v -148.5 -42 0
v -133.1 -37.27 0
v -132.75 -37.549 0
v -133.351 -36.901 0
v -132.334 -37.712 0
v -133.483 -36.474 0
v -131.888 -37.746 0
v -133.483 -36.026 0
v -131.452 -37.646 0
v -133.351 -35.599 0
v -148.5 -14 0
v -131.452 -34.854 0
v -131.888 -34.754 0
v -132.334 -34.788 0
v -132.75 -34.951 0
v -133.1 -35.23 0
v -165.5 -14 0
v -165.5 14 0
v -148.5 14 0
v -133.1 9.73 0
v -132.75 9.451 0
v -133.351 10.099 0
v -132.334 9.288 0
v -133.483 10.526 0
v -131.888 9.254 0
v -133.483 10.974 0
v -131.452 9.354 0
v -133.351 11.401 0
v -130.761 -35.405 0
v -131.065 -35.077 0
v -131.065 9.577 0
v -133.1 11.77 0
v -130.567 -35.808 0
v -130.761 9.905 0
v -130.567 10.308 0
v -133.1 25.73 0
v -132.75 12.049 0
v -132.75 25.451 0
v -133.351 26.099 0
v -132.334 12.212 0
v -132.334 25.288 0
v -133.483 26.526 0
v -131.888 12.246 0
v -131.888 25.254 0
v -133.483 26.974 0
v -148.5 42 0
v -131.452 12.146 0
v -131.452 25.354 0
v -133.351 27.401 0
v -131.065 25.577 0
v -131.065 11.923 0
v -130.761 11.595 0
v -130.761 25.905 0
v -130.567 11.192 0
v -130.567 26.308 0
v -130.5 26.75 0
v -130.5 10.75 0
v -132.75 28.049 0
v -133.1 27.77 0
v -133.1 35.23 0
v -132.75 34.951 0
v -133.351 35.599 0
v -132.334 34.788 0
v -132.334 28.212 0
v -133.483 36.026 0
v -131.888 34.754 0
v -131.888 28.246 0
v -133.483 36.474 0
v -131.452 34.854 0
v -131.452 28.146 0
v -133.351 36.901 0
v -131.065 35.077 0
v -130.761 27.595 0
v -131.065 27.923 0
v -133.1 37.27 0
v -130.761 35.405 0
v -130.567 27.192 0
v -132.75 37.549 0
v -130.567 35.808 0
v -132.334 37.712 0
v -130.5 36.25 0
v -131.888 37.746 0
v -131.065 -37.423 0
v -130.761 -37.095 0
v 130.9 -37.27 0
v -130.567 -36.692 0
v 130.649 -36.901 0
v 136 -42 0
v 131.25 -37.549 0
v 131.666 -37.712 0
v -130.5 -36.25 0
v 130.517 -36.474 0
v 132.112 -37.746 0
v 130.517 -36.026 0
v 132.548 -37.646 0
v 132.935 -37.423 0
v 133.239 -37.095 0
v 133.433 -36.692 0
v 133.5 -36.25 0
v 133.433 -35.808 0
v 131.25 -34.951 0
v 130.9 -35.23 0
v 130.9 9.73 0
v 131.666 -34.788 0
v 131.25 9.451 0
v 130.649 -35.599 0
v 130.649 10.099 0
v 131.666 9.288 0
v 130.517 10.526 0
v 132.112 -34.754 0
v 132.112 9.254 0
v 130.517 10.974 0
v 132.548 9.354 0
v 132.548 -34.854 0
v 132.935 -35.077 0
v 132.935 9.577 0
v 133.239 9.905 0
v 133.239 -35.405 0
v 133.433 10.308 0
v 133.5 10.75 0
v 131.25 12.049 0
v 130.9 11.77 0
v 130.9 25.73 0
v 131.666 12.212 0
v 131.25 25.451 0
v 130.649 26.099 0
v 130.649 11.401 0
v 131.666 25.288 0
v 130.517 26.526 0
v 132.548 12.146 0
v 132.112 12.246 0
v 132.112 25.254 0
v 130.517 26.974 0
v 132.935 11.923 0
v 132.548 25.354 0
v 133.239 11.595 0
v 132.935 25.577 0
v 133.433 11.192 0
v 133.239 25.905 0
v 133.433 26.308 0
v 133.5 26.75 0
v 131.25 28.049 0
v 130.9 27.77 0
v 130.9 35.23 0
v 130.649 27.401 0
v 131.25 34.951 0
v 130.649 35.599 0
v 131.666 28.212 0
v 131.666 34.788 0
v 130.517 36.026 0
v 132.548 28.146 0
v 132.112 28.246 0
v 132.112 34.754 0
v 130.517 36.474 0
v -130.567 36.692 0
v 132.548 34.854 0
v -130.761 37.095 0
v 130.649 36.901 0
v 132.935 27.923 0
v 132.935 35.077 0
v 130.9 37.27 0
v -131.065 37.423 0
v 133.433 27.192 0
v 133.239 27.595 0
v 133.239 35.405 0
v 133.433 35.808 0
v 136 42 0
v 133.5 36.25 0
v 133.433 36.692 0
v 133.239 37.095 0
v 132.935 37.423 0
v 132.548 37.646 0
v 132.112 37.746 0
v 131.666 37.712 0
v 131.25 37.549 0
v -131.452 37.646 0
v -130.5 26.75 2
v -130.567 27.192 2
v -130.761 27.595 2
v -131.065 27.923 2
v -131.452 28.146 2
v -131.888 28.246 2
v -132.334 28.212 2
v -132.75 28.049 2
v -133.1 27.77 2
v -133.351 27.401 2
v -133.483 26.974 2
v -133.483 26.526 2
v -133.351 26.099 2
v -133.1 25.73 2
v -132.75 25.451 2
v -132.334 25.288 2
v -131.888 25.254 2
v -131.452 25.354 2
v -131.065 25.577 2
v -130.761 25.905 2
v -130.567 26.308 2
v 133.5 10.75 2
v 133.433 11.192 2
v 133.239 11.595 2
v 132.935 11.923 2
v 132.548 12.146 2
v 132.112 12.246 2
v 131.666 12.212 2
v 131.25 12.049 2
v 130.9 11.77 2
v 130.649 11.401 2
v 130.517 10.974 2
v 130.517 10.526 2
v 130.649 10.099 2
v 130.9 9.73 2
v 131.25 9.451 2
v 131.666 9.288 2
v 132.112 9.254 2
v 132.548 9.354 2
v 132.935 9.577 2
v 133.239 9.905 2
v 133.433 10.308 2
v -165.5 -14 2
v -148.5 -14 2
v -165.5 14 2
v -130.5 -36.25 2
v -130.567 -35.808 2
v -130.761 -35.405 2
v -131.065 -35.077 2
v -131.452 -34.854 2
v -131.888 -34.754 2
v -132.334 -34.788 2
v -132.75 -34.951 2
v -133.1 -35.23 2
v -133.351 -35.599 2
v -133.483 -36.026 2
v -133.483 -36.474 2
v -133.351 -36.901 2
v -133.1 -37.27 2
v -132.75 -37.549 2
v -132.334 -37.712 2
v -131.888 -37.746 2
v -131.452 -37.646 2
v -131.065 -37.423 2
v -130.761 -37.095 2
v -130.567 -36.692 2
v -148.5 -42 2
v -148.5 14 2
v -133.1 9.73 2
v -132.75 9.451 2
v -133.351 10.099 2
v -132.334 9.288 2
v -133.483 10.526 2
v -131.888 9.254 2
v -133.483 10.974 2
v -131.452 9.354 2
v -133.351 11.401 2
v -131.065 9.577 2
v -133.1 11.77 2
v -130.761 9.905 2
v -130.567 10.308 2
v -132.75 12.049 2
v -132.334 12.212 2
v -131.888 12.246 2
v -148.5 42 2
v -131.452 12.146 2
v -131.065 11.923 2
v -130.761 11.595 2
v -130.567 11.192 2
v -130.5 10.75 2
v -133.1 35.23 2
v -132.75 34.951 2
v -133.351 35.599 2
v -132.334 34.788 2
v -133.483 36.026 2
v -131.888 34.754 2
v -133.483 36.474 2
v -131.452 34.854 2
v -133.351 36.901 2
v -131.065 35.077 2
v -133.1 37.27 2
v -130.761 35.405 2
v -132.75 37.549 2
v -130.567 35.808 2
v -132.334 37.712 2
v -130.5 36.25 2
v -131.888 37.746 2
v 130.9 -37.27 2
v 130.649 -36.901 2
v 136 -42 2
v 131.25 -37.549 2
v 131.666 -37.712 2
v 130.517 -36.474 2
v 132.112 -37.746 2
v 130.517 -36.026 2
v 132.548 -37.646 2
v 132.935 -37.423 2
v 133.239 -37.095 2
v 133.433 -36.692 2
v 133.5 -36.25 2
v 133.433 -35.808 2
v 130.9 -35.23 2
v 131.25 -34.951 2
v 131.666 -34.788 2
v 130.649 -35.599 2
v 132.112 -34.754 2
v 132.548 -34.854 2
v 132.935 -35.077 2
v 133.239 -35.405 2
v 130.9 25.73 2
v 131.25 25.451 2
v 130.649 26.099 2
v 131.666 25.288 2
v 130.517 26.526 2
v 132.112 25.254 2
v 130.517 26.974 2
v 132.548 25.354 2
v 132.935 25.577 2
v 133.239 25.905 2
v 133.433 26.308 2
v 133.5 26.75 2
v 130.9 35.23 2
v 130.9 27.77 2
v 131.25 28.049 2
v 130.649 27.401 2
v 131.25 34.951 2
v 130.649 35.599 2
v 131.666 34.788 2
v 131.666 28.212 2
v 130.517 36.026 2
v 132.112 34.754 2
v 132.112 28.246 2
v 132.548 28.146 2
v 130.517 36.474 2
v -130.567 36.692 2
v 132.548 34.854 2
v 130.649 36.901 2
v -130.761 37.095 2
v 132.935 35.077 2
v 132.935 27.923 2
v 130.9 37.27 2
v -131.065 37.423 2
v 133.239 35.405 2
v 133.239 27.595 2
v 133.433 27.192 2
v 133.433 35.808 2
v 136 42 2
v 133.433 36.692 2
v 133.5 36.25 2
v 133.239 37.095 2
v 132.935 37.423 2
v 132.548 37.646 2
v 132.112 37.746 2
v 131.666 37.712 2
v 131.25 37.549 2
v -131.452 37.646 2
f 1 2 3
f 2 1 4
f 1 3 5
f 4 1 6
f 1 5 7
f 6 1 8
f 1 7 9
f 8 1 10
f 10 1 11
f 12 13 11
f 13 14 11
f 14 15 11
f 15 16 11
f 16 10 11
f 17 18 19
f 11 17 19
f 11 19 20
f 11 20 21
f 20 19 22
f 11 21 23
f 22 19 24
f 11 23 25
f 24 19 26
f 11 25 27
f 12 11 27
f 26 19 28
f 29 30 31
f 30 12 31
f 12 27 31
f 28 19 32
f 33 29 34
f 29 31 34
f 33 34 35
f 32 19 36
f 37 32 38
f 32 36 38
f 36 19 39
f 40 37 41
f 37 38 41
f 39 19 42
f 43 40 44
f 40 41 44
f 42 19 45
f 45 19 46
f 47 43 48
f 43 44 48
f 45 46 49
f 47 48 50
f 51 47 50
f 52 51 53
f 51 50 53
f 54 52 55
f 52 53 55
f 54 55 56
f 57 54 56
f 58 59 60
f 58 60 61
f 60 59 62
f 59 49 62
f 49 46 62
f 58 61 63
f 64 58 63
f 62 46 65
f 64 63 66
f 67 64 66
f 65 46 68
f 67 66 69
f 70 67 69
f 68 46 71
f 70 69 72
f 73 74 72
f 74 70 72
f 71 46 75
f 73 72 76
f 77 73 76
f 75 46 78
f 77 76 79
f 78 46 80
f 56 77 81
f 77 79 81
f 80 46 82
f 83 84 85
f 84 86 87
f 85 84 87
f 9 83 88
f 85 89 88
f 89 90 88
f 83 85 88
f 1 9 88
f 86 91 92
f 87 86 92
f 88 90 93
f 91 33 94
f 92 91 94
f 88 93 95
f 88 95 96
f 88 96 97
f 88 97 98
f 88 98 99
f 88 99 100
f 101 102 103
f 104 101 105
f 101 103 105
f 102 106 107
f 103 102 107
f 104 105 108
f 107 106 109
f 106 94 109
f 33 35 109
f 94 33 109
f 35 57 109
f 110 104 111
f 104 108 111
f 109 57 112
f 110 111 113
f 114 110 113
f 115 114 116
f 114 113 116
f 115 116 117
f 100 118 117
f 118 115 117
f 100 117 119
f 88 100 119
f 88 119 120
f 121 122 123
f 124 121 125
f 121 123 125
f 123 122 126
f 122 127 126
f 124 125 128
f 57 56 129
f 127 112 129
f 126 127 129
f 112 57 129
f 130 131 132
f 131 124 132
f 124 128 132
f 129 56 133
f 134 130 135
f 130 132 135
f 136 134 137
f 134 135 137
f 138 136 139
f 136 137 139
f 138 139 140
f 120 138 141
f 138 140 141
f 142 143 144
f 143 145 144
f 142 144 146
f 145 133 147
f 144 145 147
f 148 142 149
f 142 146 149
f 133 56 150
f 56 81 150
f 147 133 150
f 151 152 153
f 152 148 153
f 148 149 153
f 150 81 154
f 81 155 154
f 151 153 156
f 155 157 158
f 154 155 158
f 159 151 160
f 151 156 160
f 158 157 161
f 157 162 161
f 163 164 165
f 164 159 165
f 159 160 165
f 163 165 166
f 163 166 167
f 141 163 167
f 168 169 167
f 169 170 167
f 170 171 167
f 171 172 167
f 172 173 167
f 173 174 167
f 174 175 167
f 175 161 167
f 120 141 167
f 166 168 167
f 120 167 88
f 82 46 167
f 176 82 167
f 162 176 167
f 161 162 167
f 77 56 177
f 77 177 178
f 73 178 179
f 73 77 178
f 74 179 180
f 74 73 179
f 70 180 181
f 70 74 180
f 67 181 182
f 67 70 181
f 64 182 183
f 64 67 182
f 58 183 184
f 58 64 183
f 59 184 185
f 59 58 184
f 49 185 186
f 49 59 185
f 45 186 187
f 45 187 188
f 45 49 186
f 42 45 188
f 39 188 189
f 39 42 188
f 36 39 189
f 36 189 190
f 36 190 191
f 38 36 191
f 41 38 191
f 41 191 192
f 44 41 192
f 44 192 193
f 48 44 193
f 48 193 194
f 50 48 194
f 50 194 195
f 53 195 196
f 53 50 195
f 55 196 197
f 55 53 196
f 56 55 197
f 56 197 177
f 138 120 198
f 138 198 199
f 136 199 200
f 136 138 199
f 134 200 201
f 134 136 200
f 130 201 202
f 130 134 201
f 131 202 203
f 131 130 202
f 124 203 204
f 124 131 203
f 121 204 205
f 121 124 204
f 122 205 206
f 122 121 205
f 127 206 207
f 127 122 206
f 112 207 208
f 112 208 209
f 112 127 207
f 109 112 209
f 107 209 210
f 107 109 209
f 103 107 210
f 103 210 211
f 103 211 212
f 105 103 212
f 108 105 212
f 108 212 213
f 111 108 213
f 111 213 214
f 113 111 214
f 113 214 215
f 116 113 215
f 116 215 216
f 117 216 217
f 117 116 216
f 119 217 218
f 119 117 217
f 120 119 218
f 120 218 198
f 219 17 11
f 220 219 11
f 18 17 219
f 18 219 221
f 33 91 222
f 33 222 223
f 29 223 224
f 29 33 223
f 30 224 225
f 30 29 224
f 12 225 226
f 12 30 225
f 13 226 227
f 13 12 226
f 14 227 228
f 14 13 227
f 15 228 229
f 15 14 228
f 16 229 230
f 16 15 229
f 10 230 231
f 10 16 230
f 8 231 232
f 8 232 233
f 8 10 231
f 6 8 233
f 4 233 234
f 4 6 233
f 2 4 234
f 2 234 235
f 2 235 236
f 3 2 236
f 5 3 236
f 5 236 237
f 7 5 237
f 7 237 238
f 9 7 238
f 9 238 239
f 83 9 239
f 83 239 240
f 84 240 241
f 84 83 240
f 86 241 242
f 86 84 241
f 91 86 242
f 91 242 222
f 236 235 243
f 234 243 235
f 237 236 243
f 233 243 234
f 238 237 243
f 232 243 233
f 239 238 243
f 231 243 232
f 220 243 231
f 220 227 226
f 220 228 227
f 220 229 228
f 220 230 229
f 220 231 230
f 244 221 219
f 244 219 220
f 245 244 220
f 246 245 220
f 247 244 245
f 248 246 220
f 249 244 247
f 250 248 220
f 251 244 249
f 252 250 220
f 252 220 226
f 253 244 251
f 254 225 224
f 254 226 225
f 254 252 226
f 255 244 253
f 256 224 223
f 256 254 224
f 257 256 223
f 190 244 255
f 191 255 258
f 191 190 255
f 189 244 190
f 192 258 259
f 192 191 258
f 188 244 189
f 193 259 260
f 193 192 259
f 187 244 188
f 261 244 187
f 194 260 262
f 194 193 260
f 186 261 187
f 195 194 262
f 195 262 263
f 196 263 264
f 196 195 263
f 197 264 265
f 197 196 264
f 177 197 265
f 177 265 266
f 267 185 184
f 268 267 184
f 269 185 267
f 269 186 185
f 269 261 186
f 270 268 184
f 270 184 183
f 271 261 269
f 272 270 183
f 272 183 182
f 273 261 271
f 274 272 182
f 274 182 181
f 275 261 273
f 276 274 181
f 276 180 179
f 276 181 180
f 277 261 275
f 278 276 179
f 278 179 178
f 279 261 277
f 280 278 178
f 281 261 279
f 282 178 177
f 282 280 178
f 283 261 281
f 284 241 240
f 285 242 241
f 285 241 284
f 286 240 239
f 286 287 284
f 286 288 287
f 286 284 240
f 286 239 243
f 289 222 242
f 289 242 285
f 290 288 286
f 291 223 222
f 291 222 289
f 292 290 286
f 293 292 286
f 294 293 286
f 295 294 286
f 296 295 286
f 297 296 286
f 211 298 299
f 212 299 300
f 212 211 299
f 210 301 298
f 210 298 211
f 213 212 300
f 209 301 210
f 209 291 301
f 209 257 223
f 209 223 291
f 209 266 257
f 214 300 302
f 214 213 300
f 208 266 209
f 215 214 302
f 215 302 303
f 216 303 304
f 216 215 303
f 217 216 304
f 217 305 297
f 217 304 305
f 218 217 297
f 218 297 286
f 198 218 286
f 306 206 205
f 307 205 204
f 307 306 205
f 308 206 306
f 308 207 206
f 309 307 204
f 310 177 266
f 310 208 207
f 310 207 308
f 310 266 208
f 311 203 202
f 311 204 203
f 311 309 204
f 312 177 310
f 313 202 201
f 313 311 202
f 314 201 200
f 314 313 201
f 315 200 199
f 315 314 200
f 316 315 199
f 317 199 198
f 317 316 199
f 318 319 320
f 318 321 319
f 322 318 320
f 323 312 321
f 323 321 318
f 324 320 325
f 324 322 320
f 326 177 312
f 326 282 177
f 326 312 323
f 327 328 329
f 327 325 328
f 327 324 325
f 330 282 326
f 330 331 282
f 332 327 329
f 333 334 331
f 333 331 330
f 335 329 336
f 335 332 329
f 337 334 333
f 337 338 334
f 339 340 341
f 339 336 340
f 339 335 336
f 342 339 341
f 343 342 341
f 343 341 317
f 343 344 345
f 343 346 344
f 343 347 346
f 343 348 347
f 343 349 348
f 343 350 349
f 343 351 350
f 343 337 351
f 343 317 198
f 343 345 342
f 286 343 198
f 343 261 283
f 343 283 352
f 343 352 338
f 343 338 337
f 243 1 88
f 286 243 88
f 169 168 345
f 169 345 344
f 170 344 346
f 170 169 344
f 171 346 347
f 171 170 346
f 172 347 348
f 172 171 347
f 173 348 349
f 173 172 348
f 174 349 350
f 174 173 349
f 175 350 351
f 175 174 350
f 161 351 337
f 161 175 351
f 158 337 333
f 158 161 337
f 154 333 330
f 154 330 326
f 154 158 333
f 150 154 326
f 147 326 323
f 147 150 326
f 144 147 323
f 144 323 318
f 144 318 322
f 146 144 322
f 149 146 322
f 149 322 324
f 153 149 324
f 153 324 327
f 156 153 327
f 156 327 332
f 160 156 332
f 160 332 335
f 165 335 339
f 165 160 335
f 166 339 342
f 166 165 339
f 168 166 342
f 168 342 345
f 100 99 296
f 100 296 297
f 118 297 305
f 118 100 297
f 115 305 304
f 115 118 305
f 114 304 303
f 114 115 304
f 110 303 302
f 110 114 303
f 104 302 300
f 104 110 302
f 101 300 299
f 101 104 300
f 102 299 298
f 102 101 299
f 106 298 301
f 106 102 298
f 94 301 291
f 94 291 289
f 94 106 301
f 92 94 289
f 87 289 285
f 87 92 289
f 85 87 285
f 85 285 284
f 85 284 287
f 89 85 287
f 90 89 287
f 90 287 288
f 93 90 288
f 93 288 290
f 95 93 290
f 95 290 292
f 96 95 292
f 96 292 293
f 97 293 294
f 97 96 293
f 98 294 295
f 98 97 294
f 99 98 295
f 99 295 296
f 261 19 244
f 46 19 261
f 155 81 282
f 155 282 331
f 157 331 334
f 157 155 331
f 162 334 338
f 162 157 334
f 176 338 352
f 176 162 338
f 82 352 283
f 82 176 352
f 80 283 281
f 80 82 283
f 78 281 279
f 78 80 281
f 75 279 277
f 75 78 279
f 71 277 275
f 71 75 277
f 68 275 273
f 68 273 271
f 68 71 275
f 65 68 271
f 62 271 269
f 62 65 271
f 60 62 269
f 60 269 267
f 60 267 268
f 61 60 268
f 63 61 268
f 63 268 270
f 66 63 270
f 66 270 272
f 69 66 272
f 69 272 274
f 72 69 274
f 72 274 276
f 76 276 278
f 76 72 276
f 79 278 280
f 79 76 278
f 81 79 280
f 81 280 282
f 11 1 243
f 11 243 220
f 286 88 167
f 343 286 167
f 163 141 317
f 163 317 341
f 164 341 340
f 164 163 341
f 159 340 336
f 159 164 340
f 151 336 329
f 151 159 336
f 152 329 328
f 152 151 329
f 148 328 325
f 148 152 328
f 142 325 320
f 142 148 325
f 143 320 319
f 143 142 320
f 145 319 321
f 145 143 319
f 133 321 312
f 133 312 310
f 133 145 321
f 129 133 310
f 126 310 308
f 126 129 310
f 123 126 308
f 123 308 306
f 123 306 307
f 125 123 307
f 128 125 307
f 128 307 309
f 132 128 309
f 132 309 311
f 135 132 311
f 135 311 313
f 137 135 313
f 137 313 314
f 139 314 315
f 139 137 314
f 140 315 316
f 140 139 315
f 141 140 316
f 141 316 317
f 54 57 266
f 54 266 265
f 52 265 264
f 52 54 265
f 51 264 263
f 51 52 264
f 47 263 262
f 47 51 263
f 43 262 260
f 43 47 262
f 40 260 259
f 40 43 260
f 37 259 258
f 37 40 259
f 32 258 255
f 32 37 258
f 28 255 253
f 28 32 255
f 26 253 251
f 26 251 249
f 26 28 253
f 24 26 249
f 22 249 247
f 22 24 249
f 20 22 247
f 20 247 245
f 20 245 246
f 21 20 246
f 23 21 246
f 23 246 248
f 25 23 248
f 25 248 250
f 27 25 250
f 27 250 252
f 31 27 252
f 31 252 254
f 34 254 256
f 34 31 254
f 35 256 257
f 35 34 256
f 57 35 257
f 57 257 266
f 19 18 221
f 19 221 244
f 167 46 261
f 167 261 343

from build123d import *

# Parameters (mm, degrees)
MODEL_W             = 272
MODEL_H             = 84
MODEL_R             = 1.5
MODEL_W_2           = 12.5
MODEL_W_3           = 17
MODEL_H_2           = 28
BOSS_EXTRUDE1_DEPTH = 2


with BuildPart() as part:
    # Model → Boss-Extrude1 (new body)
    # profile 1 of 3: a face of its own
    with BuildSketch(Plane.XY):
        Rectangle(MODEL_W, MODEL_H)
        with Locations((-132, 26.75)):
            Circle(MODEL_R, mode=Mode.SUBTRACT)
        with Locations((-132, -36.25)):
            Circle(MODEL_R, mode=Mode.SUBTRACT)
        with Locations((132, -36.25)):
            Circle(MODEL_R, mode=Mode.SUBTRACT)
        with Locations((132, 10.75)):
            Circle(MODEL_R, mode=Mode.SUBTRACT)
        with Locations((132, 26.75)):
            Circle(MODEL_R, mode=Mode.SUBTRACT)
        with Locations((132, 36.25)):
            Circle(MODEL_R, mode=Mode.SUBTRACT)
        with Locations((-132, 10.75)):
            Circle(MODEL_R, mode=Mode.SUBTRACT)
        with Locations((-132, 36.25)):
            Circle(MODEL_R, mode=Mode.SUBTRACT)
    # profile 2 of 3: a face of its own
    with BuildSketch(Plane.XY):
        with Locations((-142.25, 0)):
            Rectangle(MODEL_W_2, MODEL_H)
    # profile 3 of 3: a face of its own
    with BuildSketch(Plane.XY):
        with Locations((-157, 0)):
            Rectangle(MODEL_W_3, MODEL_H_2)
    extrude(amount=BOSS_EXTRUDE1_DEPTH)


solid = part.part
